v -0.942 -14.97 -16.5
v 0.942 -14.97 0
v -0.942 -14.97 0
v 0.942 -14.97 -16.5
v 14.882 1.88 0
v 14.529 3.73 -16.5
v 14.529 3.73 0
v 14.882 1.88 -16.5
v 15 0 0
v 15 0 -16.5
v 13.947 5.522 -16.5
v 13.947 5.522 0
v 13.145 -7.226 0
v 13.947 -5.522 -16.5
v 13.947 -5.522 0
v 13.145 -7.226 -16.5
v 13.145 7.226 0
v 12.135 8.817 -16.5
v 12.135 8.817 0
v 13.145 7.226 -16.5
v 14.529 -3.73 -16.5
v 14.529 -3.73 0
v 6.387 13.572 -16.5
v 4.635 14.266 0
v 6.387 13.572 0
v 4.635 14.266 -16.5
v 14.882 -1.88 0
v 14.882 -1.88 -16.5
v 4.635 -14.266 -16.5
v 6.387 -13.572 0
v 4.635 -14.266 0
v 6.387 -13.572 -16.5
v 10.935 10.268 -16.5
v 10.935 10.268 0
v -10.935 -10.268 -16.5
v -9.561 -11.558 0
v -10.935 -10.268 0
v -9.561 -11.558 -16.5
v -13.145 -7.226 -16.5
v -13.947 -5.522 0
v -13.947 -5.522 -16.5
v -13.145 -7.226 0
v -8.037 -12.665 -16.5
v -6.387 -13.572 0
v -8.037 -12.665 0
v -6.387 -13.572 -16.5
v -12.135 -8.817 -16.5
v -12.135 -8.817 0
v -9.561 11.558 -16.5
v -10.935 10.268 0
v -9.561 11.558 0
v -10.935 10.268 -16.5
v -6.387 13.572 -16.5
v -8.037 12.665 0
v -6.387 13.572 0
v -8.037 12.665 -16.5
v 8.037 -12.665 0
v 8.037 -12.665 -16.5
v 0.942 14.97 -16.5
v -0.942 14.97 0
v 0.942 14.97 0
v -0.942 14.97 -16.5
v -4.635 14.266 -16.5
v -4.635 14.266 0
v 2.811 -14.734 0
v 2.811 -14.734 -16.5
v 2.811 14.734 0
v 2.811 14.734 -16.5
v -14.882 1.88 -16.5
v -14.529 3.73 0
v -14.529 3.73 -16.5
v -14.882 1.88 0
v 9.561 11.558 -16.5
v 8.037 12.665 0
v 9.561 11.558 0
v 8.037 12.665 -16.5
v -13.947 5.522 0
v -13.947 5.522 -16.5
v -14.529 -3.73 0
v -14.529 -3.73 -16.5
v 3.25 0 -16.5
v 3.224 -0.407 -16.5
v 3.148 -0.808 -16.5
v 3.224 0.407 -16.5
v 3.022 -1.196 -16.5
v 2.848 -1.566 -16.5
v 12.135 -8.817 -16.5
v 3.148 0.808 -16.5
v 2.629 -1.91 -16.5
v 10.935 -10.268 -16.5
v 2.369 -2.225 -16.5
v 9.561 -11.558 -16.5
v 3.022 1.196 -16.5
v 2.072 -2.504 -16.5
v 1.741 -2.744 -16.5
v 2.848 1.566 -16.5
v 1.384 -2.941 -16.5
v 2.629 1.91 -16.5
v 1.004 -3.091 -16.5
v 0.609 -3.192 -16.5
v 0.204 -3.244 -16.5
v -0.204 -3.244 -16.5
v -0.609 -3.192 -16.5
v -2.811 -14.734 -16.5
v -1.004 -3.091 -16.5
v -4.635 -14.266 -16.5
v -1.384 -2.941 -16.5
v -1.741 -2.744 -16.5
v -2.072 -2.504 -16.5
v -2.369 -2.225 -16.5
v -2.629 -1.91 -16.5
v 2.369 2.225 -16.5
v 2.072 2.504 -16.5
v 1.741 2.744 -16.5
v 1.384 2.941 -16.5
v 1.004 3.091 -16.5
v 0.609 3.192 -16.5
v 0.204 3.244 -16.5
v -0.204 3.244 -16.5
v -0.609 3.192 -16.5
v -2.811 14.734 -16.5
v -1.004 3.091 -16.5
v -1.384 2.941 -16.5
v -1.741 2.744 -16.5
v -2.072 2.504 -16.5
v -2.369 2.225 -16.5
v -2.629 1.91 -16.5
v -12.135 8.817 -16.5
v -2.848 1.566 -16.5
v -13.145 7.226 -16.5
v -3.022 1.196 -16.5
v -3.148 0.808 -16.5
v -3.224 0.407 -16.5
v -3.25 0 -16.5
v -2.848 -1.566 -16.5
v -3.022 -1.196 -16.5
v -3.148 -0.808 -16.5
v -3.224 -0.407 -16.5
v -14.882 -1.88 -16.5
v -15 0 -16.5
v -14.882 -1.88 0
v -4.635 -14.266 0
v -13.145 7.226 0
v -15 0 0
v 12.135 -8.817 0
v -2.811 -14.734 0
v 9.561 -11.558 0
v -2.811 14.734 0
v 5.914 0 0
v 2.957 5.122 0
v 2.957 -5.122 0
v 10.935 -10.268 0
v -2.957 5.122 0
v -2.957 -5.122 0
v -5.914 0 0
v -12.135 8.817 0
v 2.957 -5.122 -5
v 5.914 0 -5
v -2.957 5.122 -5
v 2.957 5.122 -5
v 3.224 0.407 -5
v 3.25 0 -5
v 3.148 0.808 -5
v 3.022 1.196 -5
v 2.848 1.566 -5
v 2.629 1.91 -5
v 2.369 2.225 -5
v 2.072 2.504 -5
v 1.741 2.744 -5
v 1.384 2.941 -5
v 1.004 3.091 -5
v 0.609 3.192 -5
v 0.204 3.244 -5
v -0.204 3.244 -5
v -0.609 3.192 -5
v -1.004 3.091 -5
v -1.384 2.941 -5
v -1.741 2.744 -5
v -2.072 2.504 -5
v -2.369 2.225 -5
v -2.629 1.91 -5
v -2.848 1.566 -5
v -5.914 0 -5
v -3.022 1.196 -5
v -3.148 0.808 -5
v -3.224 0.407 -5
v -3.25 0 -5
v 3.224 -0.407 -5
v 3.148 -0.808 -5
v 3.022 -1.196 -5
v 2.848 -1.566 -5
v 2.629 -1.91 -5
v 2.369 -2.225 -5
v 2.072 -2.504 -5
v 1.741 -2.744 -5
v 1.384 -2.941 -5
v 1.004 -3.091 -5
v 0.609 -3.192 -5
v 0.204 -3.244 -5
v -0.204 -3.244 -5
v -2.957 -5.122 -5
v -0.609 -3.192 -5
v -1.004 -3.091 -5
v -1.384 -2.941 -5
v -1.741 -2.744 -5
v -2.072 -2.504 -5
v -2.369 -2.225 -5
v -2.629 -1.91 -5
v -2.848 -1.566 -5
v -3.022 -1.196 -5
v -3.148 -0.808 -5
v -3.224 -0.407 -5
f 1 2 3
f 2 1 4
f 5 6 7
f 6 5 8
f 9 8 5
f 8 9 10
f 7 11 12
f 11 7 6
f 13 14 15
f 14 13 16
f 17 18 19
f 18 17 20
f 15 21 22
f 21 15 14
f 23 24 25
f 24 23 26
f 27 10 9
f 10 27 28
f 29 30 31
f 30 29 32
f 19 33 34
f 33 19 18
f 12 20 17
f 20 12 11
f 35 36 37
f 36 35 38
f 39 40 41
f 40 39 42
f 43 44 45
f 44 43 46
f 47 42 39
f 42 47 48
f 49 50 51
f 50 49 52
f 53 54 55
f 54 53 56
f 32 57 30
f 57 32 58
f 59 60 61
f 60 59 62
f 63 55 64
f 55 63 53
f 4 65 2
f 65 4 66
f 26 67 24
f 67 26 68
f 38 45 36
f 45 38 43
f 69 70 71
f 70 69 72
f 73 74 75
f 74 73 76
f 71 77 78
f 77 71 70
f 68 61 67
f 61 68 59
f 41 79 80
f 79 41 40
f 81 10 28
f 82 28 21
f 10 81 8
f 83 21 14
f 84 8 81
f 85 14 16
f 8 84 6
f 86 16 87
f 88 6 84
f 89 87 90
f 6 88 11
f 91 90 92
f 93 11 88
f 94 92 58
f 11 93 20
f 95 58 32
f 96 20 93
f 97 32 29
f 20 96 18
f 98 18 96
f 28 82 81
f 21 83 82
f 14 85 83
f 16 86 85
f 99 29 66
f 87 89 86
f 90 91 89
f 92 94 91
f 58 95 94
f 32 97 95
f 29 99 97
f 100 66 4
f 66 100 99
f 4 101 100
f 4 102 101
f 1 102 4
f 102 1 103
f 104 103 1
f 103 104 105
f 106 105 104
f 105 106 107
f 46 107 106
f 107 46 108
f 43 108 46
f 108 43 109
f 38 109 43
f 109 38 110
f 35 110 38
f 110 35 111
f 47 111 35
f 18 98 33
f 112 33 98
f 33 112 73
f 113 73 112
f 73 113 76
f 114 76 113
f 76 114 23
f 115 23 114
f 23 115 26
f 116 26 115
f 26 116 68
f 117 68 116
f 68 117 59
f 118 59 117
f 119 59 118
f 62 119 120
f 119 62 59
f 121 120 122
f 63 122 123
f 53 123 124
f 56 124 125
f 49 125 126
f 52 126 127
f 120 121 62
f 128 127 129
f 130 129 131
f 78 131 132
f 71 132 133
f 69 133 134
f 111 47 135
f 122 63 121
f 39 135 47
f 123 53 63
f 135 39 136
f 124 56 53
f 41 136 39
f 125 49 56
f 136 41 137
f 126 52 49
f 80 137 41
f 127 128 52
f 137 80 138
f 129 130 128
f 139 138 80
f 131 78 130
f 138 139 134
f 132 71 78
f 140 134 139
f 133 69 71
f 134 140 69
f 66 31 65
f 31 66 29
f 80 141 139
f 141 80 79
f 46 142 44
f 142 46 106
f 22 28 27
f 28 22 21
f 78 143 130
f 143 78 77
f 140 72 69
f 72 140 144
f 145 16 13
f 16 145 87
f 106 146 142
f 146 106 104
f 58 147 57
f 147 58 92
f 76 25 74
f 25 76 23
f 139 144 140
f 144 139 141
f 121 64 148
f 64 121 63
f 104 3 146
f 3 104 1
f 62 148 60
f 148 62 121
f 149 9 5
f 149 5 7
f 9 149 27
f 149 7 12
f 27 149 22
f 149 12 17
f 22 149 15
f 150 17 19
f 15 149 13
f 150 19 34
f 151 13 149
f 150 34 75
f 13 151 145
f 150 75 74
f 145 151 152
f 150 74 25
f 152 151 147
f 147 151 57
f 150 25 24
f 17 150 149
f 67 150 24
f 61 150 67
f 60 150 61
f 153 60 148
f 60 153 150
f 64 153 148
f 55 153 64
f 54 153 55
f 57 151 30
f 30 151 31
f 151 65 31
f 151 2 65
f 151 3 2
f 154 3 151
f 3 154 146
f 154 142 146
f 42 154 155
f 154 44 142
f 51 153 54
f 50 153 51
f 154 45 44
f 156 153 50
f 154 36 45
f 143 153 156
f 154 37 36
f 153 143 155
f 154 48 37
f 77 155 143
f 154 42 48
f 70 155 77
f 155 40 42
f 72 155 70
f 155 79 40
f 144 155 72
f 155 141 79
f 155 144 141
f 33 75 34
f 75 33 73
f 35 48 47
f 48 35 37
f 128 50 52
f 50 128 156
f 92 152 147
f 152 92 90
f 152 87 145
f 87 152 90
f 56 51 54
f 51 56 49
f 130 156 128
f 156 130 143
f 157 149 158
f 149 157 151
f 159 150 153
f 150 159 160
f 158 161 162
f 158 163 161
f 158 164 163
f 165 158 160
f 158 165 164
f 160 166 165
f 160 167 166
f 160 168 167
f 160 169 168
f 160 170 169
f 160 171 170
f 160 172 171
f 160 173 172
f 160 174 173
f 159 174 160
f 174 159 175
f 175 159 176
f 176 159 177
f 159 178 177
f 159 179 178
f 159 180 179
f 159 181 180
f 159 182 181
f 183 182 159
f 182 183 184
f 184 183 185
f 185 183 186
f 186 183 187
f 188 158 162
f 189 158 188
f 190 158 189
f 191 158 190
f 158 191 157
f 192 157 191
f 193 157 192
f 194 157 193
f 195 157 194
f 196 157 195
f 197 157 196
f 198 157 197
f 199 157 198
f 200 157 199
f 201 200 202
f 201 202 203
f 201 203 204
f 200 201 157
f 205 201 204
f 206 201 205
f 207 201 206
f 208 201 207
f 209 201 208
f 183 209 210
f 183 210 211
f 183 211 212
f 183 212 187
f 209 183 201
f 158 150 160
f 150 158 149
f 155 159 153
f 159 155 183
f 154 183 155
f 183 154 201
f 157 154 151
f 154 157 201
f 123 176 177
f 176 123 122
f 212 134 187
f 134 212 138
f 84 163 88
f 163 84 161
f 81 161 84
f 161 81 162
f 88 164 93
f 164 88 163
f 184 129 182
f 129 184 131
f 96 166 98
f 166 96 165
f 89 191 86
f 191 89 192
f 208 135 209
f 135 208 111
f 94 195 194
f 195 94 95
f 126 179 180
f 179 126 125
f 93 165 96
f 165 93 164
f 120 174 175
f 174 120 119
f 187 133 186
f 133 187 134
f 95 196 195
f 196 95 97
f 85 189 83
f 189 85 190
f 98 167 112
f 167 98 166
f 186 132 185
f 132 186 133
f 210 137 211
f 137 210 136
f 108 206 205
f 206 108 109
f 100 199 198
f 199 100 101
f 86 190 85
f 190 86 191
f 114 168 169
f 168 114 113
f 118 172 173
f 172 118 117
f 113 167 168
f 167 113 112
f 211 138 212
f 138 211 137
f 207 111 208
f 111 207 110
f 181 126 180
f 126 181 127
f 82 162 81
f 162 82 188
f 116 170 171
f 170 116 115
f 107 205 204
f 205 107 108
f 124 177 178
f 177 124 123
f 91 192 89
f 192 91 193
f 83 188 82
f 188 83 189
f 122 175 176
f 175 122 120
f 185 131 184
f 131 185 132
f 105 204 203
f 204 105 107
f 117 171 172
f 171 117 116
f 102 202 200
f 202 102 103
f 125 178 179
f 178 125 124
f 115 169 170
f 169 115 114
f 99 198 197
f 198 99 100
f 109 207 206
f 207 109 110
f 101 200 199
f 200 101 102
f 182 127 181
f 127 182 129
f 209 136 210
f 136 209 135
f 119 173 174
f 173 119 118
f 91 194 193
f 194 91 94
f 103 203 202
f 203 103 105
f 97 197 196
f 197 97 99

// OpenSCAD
$fn = 50;

difference() {
	union() {
		translate(v = [0, 0, -16.5]) {
			cylinder(h = 16.5, r = 15.0);
		}
		#translate(v = [0, 0, -18.0]) {
			cylinder(h = 18, r = 2.875);
		}
	}
	union() {
		translate(v = [0, 0, 0]) {
			rotate(a = [0, 0, 0]) {
				difference() {
					union() {
						translate(v = [0, 0, -5]) {
							linear_extrude(height = 5) {
								polygon(points = [[5.914249999999999, 0.0], [2.957125, 5.1218907443321156], [-2.9571249999999982, 5.1218907443321156], [-5.914249999999999, 7.242867331857232e-16], [-2.9571250000000022, -5.121890744332115], [2.9571249999999956, -5.121890744332118]]);
							}
						}
					}
					union();
				}
			}
		}
		#translate(v = [0, 0, -100.0]) {
			cylinder(h = 200, r = 3.25);
		}
	}
}
